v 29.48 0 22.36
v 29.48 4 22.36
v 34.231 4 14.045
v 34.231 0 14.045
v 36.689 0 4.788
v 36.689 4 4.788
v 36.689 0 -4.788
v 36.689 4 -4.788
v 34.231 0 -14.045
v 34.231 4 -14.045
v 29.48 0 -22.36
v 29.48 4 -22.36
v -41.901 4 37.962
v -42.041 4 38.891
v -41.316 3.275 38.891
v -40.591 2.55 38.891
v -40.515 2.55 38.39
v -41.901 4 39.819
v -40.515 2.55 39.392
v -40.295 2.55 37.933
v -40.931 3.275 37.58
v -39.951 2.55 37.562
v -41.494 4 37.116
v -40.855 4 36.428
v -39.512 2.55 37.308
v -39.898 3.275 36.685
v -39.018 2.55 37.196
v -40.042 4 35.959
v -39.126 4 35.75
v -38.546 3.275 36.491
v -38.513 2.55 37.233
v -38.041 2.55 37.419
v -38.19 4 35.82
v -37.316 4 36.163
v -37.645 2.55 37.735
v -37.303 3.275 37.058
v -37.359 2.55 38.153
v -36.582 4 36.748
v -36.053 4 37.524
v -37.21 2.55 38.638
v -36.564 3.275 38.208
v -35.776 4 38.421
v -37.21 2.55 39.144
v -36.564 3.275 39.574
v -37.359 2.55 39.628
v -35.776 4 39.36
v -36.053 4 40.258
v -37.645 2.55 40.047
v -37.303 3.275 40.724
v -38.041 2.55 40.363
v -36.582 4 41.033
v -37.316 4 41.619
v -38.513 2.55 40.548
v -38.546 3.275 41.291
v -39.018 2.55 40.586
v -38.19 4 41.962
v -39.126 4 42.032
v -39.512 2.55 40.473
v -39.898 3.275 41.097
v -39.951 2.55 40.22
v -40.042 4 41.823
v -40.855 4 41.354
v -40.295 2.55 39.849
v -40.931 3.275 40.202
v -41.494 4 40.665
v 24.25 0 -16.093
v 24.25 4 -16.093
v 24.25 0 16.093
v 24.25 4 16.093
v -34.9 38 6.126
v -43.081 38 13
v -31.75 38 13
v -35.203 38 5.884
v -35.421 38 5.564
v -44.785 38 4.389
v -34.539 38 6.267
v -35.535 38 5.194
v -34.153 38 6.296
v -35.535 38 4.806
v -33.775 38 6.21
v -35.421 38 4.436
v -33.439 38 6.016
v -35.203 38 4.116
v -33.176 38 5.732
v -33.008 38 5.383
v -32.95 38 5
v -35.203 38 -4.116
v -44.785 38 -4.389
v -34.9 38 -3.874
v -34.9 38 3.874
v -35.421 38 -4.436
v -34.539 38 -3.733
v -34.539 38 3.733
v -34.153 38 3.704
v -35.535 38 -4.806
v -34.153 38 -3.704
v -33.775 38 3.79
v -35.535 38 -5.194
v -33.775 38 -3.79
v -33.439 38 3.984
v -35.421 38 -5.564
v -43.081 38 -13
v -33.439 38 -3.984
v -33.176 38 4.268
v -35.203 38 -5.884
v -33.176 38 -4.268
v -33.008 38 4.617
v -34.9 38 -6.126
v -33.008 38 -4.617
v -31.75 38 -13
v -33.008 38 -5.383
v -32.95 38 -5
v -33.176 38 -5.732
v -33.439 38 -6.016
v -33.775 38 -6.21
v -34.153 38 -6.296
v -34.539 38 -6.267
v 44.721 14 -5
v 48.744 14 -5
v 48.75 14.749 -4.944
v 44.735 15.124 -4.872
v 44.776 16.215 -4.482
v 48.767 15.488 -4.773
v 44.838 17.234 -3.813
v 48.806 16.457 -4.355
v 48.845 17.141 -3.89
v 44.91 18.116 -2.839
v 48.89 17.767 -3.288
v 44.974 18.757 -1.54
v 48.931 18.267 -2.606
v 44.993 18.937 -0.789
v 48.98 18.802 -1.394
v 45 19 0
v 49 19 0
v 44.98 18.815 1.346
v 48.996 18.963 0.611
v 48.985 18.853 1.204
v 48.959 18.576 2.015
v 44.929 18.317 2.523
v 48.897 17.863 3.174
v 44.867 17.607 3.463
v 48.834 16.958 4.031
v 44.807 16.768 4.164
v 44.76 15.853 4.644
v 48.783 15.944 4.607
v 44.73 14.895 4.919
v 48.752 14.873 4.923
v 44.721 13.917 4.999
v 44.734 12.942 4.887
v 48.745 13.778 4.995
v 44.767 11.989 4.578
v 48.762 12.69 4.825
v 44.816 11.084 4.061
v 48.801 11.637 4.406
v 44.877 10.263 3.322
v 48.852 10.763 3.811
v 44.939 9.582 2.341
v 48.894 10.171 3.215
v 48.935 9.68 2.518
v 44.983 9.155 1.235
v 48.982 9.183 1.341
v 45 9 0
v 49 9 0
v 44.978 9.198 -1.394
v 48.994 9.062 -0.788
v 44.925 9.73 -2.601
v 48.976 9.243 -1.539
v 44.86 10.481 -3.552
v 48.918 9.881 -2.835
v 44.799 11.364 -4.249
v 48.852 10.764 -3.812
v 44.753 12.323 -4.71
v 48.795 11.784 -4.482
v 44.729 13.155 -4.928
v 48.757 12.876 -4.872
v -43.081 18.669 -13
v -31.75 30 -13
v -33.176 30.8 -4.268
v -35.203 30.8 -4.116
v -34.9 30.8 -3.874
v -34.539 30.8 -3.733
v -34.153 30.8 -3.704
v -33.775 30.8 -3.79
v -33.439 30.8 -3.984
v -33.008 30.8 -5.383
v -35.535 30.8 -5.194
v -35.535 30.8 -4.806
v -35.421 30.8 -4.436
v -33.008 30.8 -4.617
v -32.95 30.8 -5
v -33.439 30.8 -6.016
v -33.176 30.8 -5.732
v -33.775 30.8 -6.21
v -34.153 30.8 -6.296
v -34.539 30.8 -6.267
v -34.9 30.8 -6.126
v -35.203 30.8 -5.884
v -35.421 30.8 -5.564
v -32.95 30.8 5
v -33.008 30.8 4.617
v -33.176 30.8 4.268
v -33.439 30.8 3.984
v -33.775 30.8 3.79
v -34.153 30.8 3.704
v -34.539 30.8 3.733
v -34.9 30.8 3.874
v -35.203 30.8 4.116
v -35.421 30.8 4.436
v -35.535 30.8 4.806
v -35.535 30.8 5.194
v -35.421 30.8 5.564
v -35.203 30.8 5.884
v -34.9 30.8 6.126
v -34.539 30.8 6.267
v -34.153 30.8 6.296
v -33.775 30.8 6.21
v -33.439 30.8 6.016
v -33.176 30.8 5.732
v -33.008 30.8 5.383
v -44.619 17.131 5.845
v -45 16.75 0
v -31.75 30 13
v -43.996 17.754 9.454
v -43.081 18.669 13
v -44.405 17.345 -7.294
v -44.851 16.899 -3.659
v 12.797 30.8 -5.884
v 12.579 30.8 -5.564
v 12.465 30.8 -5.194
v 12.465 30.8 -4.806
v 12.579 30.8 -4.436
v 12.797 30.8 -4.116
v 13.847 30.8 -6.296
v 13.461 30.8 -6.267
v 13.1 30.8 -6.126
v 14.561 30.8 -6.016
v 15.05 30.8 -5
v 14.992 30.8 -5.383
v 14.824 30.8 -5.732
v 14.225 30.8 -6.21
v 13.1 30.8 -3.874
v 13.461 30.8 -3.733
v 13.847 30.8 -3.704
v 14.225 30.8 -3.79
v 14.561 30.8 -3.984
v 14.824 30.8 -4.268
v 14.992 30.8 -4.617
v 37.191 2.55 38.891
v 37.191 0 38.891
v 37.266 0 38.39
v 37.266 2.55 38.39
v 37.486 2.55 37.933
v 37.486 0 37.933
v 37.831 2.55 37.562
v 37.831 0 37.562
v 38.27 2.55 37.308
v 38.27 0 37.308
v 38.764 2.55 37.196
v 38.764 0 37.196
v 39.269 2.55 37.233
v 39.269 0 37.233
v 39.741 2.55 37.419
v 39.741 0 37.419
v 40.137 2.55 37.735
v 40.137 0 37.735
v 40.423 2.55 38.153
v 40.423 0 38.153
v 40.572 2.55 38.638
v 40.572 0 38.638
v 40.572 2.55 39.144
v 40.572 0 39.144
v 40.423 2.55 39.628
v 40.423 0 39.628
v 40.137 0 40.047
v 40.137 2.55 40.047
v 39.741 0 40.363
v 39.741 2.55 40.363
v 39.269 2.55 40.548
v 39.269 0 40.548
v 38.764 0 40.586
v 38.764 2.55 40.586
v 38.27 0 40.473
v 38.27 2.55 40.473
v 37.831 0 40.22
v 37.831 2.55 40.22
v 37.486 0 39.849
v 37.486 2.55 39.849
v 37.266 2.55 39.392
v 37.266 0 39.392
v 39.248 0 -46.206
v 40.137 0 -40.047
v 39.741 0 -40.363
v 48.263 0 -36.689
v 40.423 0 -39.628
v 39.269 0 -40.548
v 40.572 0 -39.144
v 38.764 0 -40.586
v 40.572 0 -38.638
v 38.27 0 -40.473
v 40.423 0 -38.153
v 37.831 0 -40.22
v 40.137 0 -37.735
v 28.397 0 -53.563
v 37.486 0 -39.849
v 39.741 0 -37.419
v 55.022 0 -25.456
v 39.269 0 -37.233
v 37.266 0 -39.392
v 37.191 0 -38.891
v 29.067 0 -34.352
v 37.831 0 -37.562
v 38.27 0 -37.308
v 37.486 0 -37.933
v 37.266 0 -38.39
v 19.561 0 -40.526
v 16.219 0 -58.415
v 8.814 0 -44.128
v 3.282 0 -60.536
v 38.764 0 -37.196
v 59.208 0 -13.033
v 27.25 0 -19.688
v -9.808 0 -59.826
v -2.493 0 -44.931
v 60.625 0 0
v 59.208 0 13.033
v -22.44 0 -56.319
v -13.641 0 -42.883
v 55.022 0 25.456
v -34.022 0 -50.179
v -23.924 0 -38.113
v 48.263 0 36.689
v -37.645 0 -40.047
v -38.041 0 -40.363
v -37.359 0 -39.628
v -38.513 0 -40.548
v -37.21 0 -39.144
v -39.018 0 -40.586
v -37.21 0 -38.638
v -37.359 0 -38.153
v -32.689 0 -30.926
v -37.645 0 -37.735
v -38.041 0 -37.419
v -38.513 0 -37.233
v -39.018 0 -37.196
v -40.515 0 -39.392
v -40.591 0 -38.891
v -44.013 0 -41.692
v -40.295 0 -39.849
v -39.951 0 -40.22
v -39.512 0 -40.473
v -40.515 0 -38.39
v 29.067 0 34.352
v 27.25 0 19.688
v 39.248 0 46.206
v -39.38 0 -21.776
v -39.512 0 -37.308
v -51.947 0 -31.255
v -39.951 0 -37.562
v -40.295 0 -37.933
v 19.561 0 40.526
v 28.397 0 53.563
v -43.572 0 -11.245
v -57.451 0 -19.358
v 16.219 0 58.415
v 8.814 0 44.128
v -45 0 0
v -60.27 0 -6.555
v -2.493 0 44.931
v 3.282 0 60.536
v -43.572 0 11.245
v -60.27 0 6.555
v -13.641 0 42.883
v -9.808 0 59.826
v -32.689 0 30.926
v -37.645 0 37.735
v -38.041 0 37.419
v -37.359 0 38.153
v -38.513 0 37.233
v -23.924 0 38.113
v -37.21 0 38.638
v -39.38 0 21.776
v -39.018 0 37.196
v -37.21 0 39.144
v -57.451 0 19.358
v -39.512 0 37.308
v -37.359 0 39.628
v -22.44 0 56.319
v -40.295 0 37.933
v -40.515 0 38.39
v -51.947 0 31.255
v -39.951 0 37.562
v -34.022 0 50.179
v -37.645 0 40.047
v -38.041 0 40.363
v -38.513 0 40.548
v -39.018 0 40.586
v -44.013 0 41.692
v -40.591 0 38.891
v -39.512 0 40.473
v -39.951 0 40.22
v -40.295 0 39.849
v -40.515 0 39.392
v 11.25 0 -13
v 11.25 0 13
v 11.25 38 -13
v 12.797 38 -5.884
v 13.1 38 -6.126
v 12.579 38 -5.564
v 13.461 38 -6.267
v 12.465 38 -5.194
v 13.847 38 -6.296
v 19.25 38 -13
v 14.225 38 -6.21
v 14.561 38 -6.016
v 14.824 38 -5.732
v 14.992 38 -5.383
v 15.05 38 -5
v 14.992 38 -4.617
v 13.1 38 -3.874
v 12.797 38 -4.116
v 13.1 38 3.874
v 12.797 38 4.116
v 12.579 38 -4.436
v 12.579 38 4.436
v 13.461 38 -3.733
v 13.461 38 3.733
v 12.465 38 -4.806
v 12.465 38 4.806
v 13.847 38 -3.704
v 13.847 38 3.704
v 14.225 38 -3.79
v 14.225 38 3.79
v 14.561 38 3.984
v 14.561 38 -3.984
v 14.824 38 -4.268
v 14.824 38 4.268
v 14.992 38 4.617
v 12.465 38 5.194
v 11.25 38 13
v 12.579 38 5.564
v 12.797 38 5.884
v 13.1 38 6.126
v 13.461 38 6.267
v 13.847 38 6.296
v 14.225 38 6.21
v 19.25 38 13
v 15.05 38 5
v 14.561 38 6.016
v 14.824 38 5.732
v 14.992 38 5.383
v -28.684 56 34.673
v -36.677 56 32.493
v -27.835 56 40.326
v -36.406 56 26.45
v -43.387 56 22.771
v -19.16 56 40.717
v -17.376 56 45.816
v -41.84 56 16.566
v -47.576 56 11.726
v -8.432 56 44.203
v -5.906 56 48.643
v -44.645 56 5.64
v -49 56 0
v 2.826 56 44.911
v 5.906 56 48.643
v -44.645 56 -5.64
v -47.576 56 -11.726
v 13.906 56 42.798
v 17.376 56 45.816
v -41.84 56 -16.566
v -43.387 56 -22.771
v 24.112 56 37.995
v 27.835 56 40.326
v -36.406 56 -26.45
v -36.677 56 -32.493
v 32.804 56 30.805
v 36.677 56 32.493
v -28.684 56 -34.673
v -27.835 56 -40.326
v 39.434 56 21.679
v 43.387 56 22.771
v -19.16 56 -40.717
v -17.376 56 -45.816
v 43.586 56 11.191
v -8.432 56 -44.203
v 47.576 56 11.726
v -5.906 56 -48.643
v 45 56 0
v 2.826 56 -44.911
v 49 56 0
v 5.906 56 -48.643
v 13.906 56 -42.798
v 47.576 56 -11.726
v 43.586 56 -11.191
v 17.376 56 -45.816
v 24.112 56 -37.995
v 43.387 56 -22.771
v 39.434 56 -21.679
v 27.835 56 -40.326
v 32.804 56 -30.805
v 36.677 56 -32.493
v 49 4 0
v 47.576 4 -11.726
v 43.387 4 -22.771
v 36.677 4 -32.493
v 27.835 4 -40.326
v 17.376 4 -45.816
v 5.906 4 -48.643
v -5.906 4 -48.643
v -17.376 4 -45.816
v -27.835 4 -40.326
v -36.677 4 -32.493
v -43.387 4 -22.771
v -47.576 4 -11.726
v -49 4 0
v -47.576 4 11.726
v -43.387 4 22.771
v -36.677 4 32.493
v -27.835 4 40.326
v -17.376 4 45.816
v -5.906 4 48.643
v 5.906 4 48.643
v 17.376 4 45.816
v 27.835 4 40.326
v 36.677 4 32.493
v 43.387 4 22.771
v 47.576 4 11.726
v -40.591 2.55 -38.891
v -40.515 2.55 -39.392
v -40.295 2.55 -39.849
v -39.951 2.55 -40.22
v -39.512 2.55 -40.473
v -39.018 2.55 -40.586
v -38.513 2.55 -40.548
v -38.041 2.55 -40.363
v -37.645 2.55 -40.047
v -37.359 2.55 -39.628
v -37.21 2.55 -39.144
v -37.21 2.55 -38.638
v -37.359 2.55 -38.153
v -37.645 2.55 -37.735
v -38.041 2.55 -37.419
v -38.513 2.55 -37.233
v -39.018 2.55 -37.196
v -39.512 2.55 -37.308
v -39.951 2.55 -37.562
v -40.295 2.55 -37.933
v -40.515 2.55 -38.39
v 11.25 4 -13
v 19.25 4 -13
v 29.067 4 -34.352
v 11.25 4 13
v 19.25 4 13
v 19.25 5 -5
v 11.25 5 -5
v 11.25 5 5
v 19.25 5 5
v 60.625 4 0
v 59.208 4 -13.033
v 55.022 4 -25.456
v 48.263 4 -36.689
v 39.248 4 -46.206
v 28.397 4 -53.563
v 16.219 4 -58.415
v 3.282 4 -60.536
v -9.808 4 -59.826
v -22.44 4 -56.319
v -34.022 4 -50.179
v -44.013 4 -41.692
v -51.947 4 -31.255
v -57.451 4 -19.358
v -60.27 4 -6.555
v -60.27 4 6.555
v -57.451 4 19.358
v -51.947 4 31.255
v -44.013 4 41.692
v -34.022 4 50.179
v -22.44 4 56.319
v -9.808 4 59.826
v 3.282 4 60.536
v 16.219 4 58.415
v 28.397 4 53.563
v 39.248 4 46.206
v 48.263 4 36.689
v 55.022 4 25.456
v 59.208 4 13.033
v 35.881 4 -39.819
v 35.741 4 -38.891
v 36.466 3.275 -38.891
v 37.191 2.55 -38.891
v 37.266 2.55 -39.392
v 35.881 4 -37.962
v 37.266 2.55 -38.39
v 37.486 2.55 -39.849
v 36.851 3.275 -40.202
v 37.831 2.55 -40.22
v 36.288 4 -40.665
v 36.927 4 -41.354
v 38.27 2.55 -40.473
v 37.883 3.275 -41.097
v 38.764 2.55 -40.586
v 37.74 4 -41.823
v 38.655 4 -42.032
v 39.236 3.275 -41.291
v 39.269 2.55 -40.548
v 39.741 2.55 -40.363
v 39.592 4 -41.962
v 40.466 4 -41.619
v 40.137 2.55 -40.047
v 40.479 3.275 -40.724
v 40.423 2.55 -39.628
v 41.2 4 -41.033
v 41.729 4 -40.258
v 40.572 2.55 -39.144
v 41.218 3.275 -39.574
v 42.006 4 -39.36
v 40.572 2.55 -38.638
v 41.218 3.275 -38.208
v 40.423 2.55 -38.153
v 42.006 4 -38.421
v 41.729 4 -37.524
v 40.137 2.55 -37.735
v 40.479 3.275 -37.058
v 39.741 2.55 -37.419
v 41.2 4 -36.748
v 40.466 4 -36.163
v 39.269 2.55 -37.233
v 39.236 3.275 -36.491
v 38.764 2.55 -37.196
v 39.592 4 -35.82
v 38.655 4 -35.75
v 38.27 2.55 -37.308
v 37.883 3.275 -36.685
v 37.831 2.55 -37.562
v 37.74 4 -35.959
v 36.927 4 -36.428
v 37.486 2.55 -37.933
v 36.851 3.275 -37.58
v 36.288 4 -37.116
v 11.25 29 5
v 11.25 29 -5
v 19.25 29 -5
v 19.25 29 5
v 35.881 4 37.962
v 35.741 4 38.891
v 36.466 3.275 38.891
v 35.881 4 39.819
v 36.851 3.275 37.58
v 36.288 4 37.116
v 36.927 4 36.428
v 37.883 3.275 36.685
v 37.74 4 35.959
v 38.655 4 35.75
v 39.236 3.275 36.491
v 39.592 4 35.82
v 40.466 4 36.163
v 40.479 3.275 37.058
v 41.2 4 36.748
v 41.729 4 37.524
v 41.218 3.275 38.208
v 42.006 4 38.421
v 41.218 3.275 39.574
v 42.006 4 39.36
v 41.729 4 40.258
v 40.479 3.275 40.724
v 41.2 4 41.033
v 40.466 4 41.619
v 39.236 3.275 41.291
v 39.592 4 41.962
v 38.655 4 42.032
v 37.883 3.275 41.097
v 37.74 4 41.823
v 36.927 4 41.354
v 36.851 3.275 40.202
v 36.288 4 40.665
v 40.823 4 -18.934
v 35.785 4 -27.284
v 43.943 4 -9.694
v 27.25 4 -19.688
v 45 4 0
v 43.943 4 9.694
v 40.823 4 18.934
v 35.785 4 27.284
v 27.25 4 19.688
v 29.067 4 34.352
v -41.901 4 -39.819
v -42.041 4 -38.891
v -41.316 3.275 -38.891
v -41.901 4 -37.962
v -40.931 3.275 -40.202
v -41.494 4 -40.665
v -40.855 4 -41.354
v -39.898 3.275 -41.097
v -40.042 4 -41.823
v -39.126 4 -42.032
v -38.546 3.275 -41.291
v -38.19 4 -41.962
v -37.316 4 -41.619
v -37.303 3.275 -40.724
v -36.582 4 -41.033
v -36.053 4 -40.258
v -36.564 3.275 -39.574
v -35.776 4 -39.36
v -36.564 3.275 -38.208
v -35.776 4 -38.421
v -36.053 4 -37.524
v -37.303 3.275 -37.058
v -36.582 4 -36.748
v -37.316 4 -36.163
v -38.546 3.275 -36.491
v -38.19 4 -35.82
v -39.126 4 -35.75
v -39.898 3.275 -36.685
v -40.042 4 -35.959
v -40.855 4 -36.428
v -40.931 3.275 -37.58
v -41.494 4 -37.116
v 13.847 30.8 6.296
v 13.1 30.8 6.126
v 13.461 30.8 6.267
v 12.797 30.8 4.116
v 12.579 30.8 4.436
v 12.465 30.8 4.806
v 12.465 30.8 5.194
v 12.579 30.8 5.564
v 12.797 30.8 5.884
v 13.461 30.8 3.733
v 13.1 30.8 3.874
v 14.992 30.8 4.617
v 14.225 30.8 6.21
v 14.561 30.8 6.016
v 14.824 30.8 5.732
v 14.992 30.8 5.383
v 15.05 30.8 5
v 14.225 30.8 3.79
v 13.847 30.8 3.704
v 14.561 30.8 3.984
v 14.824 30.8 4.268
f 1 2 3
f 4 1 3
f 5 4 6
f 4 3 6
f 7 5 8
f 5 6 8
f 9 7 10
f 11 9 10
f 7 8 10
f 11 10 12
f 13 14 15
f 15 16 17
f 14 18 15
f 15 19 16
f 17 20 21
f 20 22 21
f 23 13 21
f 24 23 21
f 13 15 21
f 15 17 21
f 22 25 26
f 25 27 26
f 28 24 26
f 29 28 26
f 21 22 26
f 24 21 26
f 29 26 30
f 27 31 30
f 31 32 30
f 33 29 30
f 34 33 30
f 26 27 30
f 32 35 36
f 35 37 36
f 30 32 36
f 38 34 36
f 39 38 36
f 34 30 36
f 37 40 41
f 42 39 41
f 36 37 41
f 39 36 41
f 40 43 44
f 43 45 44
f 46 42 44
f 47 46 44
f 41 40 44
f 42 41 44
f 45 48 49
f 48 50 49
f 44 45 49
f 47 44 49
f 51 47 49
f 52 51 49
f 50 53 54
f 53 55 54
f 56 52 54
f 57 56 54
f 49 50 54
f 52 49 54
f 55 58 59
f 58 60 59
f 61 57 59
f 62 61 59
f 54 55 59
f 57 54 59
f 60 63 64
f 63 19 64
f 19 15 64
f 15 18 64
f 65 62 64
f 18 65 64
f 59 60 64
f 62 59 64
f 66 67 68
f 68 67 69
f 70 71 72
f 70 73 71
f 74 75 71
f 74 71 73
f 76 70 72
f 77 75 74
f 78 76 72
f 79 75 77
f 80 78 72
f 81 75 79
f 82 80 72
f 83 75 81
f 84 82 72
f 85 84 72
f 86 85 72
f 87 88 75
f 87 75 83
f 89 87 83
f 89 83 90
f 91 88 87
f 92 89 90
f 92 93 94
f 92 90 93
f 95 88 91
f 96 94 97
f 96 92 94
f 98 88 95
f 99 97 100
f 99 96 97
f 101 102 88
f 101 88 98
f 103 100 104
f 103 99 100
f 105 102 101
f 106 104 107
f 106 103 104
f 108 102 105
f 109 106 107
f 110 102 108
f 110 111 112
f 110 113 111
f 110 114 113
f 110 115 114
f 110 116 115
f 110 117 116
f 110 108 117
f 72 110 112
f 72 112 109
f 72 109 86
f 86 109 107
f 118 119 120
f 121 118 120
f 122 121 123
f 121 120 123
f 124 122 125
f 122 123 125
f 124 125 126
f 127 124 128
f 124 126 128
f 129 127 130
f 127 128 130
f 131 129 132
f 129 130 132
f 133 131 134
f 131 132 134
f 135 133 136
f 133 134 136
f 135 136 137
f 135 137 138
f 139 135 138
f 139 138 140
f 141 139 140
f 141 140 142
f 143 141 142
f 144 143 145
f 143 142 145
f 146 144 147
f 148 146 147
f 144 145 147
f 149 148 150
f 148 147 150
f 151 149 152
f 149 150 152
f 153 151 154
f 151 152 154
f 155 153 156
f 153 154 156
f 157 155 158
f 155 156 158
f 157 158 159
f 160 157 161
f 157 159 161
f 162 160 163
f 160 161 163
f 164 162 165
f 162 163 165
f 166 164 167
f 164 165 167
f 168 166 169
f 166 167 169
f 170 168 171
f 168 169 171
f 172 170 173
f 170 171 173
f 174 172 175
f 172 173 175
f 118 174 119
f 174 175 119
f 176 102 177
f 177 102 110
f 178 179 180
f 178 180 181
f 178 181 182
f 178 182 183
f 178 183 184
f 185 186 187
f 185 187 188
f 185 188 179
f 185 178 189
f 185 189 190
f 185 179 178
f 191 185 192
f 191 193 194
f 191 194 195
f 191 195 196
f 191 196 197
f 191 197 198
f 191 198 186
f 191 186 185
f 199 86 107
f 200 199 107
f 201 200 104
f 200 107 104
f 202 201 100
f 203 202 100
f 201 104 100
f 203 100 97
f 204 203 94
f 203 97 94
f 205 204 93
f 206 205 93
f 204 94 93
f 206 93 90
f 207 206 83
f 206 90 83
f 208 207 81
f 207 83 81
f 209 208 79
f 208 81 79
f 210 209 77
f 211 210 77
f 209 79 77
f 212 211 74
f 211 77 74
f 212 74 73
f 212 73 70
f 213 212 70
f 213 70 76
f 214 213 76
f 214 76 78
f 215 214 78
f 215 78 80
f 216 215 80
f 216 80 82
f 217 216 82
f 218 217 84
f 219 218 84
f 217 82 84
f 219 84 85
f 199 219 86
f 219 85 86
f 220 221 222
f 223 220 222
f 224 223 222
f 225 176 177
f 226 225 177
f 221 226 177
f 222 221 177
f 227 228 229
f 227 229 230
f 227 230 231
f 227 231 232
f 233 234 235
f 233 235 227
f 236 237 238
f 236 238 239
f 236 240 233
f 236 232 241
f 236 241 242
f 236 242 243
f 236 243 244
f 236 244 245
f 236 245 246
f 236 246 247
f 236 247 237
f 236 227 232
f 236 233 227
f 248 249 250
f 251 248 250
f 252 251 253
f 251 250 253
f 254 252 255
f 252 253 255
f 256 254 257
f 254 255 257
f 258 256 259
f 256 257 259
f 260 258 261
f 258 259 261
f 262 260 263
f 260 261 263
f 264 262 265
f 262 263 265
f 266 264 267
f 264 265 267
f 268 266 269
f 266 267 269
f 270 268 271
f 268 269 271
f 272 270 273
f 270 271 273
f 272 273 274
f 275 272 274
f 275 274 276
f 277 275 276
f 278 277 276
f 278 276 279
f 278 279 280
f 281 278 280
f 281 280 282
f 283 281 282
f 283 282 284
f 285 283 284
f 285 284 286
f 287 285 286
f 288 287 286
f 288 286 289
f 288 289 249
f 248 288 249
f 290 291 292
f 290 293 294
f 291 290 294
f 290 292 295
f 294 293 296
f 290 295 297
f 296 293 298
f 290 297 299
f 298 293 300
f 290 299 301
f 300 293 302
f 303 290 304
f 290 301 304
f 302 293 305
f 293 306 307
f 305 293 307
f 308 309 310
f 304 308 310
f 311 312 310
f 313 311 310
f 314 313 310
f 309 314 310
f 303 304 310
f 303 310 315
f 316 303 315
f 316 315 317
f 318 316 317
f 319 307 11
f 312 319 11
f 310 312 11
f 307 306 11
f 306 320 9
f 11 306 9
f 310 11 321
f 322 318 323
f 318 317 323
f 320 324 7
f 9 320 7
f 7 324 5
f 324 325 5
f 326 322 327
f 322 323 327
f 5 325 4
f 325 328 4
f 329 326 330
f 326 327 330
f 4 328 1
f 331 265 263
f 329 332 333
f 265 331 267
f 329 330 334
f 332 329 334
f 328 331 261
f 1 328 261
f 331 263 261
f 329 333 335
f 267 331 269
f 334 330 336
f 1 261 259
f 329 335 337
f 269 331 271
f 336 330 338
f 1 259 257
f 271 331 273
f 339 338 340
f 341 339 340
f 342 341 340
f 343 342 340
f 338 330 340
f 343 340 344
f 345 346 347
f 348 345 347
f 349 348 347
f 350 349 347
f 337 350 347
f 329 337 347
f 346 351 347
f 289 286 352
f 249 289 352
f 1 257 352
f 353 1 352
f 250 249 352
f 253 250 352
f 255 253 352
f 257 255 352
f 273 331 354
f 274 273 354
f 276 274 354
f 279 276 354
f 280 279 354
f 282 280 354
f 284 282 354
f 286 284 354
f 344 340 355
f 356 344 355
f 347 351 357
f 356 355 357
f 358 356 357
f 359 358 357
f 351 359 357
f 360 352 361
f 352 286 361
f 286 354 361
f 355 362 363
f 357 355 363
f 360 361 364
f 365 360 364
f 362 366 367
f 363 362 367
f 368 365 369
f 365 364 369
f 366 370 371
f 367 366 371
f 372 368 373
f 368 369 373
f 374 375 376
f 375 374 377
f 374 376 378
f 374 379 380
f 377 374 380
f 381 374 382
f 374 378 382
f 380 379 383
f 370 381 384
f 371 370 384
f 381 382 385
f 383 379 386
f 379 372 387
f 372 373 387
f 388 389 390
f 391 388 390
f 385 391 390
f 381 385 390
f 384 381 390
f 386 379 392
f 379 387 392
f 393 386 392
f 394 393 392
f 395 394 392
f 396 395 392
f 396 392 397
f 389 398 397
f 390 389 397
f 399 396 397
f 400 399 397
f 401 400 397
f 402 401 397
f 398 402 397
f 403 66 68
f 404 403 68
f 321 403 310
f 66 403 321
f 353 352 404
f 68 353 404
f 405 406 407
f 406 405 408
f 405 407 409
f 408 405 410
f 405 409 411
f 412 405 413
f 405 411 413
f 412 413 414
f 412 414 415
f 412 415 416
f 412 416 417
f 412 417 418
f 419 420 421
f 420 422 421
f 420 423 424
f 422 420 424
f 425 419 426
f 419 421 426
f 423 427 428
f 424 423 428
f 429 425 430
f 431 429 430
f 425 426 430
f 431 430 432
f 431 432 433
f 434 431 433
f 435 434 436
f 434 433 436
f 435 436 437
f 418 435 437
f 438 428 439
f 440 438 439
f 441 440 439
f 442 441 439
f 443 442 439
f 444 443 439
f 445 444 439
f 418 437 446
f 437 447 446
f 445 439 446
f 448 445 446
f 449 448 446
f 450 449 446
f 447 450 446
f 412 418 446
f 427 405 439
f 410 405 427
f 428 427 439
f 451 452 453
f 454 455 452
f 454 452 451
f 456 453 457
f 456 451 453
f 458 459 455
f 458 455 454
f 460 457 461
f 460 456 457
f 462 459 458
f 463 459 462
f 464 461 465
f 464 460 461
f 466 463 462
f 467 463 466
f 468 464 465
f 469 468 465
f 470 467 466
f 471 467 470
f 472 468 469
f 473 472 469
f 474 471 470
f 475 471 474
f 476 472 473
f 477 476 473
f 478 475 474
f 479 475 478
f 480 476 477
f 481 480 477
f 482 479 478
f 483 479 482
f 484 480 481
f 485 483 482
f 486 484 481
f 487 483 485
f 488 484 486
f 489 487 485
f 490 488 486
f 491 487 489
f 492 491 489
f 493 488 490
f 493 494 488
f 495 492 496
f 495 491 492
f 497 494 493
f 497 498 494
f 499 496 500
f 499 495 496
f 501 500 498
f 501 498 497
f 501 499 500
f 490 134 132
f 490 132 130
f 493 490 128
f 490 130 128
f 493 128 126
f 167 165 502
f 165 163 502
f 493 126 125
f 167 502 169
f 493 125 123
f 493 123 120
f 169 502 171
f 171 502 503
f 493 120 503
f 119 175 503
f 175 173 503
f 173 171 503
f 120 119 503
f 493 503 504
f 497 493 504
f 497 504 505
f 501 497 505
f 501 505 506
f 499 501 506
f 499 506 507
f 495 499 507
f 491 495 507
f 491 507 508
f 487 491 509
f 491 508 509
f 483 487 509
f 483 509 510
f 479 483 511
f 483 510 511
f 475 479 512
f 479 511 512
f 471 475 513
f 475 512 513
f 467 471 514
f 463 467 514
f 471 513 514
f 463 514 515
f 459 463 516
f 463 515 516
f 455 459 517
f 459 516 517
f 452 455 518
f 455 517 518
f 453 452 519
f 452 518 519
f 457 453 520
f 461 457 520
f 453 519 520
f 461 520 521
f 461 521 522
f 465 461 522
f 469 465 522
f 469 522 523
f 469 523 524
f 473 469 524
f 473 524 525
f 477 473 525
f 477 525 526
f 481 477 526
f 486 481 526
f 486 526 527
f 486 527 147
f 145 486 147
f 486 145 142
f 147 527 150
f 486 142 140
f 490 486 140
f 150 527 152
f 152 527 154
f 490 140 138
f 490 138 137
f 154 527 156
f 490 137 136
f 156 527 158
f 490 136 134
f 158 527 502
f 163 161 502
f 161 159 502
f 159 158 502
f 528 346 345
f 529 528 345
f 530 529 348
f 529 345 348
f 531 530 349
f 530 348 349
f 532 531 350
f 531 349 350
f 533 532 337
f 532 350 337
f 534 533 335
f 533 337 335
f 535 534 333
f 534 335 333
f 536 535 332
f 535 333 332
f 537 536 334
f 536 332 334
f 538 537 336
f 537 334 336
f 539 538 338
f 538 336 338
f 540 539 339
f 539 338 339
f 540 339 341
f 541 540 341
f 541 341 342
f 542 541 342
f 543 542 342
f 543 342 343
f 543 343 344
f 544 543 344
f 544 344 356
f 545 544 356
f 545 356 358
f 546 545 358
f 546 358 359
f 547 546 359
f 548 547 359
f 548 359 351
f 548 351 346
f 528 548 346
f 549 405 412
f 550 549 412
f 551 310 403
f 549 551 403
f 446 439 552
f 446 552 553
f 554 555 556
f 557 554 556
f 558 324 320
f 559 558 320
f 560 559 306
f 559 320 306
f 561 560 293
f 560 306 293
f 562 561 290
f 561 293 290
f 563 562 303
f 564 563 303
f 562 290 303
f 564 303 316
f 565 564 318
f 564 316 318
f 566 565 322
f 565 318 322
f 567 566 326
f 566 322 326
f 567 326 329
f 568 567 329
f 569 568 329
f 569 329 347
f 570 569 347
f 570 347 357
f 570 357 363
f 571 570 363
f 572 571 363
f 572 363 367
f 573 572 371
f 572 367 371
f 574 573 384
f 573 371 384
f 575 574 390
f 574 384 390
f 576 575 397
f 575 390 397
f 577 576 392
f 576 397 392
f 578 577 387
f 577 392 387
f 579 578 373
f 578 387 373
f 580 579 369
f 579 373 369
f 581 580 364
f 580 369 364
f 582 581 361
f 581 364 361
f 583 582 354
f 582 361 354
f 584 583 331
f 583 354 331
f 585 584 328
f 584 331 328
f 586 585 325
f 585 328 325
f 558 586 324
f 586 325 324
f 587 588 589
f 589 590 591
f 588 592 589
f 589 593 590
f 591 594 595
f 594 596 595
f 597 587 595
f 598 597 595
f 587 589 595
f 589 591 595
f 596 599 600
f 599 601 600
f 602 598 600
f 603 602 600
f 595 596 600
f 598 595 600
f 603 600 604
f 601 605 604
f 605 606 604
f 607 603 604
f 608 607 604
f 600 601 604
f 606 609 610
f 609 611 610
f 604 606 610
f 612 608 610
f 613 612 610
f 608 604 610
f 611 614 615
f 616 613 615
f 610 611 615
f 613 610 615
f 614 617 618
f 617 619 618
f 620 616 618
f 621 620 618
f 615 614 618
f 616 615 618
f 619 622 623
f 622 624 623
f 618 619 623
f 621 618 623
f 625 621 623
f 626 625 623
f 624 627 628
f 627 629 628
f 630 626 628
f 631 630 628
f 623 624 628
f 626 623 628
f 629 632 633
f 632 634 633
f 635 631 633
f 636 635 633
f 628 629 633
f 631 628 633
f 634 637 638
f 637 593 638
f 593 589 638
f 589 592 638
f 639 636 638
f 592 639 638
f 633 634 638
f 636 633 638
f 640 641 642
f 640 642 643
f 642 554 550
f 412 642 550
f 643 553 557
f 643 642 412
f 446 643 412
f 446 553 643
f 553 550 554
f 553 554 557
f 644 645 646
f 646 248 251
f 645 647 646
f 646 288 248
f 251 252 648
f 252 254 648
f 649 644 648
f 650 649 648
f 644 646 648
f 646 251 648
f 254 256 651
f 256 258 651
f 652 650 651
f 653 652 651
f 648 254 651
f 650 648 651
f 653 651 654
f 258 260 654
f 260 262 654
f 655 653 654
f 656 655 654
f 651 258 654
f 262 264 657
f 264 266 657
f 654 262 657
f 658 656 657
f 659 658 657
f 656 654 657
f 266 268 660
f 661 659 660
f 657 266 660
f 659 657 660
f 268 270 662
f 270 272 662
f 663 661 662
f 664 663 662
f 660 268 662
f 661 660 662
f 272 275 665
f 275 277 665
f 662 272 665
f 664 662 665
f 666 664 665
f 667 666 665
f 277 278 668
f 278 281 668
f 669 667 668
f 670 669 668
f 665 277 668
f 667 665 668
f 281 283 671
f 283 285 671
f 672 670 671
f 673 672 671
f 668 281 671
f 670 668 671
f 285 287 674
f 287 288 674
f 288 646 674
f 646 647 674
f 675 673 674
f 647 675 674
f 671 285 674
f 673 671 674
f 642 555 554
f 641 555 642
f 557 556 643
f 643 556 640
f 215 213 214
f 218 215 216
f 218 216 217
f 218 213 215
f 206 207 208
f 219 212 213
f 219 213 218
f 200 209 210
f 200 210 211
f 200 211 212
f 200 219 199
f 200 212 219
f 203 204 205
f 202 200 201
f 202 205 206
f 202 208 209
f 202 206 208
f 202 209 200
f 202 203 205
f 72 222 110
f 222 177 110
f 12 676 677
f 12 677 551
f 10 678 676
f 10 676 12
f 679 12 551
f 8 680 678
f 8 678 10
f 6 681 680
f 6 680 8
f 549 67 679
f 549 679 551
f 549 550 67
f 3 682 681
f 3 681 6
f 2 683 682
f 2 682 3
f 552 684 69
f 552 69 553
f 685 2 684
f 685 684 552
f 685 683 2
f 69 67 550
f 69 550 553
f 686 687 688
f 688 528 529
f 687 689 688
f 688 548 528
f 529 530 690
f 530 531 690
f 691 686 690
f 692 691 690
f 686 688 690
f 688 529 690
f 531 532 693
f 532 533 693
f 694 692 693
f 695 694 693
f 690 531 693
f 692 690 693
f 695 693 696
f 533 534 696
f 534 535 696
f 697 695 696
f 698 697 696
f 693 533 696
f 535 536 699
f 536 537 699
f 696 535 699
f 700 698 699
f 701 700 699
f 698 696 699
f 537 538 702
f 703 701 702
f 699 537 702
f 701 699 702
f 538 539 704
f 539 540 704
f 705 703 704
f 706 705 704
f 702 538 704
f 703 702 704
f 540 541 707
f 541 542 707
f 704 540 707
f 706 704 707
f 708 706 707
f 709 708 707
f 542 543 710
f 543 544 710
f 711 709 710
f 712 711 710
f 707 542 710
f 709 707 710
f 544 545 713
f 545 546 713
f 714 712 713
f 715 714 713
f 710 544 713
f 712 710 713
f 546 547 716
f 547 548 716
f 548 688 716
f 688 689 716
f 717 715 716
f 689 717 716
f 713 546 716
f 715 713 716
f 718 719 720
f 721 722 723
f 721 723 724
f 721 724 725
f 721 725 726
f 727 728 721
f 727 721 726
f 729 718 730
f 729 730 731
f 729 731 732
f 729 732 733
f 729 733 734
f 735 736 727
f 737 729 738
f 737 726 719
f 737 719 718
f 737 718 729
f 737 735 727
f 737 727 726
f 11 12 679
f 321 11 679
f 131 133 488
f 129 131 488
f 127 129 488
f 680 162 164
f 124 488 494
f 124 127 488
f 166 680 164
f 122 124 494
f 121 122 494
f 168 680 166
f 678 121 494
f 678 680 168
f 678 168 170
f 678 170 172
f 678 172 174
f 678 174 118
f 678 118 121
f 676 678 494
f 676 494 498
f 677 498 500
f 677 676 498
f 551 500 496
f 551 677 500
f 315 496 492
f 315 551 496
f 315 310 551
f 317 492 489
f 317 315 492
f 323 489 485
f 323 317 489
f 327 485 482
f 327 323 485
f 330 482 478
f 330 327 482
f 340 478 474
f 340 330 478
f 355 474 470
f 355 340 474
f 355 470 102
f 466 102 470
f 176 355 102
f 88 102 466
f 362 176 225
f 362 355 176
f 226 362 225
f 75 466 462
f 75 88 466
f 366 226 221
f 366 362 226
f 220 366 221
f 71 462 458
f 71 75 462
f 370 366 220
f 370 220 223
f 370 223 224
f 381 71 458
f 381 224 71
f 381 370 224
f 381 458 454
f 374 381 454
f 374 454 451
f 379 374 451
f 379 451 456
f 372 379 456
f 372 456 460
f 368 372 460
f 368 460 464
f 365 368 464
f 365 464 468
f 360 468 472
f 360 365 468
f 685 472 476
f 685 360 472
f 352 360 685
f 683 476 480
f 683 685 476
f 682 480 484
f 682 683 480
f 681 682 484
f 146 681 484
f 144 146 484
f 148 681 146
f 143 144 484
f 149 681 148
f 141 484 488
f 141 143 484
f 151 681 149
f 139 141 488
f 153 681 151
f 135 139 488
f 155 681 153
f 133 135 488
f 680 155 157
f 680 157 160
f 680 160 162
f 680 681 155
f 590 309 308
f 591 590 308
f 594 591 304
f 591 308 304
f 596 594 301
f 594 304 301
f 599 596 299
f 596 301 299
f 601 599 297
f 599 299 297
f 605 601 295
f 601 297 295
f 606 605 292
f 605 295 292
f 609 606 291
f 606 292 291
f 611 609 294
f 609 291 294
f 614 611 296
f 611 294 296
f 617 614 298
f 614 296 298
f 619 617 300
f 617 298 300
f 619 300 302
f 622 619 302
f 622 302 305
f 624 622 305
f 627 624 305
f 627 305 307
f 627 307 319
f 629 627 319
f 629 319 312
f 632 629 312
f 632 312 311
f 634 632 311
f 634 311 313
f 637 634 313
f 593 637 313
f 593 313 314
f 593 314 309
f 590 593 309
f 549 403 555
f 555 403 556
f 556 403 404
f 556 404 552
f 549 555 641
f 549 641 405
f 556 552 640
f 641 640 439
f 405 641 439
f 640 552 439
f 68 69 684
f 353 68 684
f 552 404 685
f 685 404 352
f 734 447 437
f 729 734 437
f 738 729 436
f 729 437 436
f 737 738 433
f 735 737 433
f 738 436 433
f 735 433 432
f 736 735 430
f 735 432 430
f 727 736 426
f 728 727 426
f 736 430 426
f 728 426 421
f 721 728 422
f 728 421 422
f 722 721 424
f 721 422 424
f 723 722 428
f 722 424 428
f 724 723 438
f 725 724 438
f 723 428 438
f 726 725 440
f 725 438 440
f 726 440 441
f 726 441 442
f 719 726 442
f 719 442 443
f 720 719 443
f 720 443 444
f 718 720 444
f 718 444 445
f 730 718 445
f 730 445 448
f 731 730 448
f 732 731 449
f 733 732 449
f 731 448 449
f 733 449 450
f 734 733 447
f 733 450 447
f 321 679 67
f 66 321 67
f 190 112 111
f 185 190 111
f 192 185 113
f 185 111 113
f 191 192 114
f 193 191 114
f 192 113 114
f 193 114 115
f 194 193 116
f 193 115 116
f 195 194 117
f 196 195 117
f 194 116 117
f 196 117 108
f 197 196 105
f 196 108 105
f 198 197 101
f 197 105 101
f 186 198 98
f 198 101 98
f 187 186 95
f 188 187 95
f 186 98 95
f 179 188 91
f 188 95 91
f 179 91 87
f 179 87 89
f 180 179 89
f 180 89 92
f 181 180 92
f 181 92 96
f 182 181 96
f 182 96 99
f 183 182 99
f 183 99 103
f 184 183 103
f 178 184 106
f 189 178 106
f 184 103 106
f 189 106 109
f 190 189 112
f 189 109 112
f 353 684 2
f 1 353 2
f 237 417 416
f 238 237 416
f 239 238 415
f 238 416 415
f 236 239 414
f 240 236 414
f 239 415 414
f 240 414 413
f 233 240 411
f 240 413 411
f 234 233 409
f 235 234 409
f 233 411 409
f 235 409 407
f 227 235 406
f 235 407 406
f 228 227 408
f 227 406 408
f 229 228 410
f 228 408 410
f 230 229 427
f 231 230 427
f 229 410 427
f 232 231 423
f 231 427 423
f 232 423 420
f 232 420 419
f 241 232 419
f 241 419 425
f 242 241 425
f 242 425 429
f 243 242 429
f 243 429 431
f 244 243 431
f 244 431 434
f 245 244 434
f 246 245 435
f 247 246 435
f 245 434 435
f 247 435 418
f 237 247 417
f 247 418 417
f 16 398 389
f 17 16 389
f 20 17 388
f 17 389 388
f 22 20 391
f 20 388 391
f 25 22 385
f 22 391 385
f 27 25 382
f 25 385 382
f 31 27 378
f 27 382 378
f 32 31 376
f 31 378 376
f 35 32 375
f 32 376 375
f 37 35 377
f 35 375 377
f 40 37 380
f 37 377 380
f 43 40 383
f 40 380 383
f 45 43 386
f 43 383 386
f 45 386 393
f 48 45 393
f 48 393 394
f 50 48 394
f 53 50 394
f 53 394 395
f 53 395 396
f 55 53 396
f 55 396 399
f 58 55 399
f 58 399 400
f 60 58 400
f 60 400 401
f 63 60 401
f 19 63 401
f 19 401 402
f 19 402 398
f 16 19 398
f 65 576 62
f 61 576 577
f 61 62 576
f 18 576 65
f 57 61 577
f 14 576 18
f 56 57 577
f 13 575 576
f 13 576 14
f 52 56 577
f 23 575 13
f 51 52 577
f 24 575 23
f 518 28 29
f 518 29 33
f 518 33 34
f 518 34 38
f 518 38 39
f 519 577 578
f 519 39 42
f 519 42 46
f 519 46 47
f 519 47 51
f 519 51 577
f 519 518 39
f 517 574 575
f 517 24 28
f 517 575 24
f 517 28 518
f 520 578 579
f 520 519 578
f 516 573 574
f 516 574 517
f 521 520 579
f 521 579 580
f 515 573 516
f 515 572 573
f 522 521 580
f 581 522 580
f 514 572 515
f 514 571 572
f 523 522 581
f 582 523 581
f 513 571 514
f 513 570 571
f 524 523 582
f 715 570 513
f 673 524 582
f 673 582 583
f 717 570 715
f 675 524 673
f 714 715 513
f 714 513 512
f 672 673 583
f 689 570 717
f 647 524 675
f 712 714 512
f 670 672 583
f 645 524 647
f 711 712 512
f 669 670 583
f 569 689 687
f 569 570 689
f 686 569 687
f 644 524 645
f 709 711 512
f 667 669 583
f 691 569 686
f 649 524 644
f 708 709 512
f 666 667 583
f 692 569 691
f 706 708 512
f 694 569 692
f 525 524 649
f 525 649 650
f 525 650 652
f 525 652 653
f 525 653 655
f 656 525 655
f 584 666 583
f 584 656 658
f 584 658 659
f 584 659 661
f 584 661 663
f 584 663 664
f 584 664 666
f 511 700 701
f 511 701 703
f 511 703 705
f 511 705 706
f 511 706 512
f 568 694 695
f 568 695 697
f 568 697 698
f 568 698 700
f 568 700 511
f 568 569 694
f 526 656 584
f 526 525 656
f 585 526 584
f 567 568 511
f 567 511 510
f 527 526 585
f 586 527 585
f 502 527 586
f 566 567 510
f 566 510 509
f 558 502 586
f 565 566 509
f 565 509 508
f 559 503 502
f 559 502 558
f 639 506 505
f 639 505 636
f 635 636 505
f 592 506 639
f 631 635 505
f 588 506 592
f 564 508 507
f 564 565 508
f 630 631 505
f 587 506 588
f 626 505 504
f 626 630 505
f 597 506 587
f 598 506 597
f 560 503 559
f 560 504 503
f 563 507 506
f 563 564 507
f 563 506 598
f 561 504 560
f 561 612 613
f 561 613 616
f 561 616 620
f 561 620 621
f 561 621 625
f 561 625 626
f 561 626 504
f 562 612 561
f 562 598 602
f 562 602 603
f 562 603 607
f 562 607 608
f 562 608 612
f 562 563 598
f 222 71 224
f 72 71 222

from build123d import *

# Parameters (mm, degrees)
SKETCH1_R                                           = 60.625
SKETCH1_R_2                                         = 45
BOSS_EXTRUDE1_DEPTH                                 = 4
SKETCH2_R                                           = 49
SKETCH2_R_2                                         = 45
BOSS_EXTRUDE2_DEPTH                                 = 52
SKETCH4_W                                           = 13.25
SKETCH4_H                                           = 8
SKETCH4_W_2                                         = 8
SKETCH4_H_2                                         = 38
BOSS_EXTRUDE4_DEPTH                                 = 13
BOSS_EXTRUDE5_DEPTH                                 = 4
SKETCH7_R                                           = 1.3
CUT_EXTRUDE4_DEPTH                                  = 7.2
SKETCH9_W                                           = 10
SKETCH9_H                                           = 24
CUT_EXTRUDE7_DEPTH                                  = 8
CUT_EXTRUDE8_REACH                                  = 111.625
SKETCH11_R                                          = 5
CUT_EXTRUDE9_DEPTH                                  = 5.0000001
CSK_FOR_M3_COUNTERSUNK_FLAT_HEAD_SCREW1_D           = 3.4
CSK_FOR_M3_COUNTERSUNK_FLAT_HEAD_SCREW1_DEPTH       = 4
CSK_FOR_M3_COUNTERSUNK_FLAT_HEAD_SCREW1_CSINK_D     = 6.3
CSK_FOR_M3_COUNTERSUNK_FLAT_HEAD_SCREW1_CSINK_ANGLE = 90


with BuildPart() as part:
    # Sketch1 → Boss-Extrude1 (new body)
    with BuildSketch(Plane(origin=(0, 0, 0), x_dir=(1, 0, 0), z_dir=(0, 1, 0))):
        Circle(SKETCH1_R)
        Circle(SKETCH1_R_2, mode=Mode.SUBTRACT)
    extrude(amount=BOSS_EXTRUDE1_DEPTH)

    # Sketch2 → Boss-Extrude2 (add)
    with BuildSketch(Plane(origin=(0, 4, 0), x_dir=(1, 0, 0), z_dir=(0, 1, 0))):
        Circle(SKETCH2_R)
        Circle(SKETCH2_R_2, mode=Mode.SUBTRACT)
    extrude(amount=BOSS_EXTRUDE2_DEPTH)

    # Sketch4 → Boss-Extrude4 (add, symmetric)
    with BuildSketch(Plane.XY):
        with Locations((-38.375, 34)):
            Rectangle(SKETCH4_W, SKETCH4_H)
        Polygon((-31.75, 30), (-45, 30), (-45, 16.75), align=None)
        with Locations((15.25, 19)):
            Rectangle(SKETCH4_W_2, SKETCH4_H_2)
    extrude(amount=BOSS_EXTRUDE4_DEPTH, both=True)

    # Sketch5 → Boss-Extrude5 (add)
    with BuildSketch(Plane.XZ):
        with BuildLine():
            Line((11.25, 13), (29.067400866, 34.352382842))
            ThreePointArc((29.067400866, 34.352382842), (45, 0), (29.067400866, -34.352382842))
            Line((29.067400866, -34.352382842), (11.25, -13))
            Line((11.25, -13), (11.25, 13))
        make_face()
    extrude(amount=-BOSS_EXTRUDE5_DEPTH)

    # Sketch7 → Cut-Extrude4 (cut)
    with BuildSketch(Plane(origin=(0, 38, 0), x_dir=(1, 0, 0), z_dir=(0, 1, 0))):
        with Locations((-34.25, 5)):
            Circle(SKETCH7_R)
        with Locations((-34.25, -5)):
            Circle(SKETCH7_R)
        with Locations((13.75, 5)):
            Circle(SKETCH7_R)
        with Locations((13.75, -5)):
            Circle(SKETCH7_R)
    extrude(amount=-CUT_EXTRUDE4_DEPTH, mode=Mode.SUBTRACT)

    # Sketch9 → Cut-Extrude7 (cut)
    with BuildSketch(Plane.ZY.offset(-11.25)):
        with Locations((0, 17)):
            Rectangle(SKETCH9_W, SKETCH9_H)
    extrude(amount=-CUT_EXTRUDE7_DEPTH, mode=Mode.SUBTRACT)

    # Sketch11 → Cut-Extrude8 (cut, up to next)
    with BuildSketch(Plane(origin=(49, 0, 0), x_dir=(0, 0, -1), z_dir=(1, 0, 0)), mode=Mode.PRIVATE) as cut_extrude8_sk1:
        with Locations((0, 14)):
            Circle(SKETCH11_R)
    cut_extrude8_tool1 = extrude(cut_extrude8_sk1.sketch, amount=-CUT_EXTRUDE8_REACH, mode=Mode.PRIVATE) & part.part
    add(cut_extrude8_tool1.solids().sort_by_distance((49, 14, 0))[0], mode=Mode.SUBTRACT)

    # Sketch12 → Cut-Extrude9 (cut, through all)
    with BuildSketch(Plane(origin=(0, 4, 0), x_dir=(1, 0, 0), z_dir=(0, 1, 0))):
        with BuildLine():
            Line((29.479537487, 22.359715328), (27.25, 19.687836398))
            Line((27.25, 19.687836398), (27.25, -19.687836398))
            Line((27.25, -19.687836398), (29.479537487, -22.359715328))
            ThreePointArc((29.479537487, -22.359715328), (37, 0), (29.479537487, 22.359715328))
        make_face()
        Polygon((27.25, -19.687836398), (27.25, 19.687836398), (24.25, 16.092634774), (24.25, -16.092634774), align=None)
    extrude(amount=-CUT_EXTRUDE9_DEPTH, mode=Mode.SUBTRACT)

    # CSK for M3 Countersunk Flat Head Screw1
    with Locations(Plane(origin=(0, 4, 0), x_dir=(1, 0, 0), z_dir=(0, 1, 0))):
        with Locations((-38.890872965, 38.890872965), (-38.890872965, -38.890872965), (38.890872965, -38.890872965), (38.890872965, 38.890872965)):
            CounterSinkHole(CSK_FOR_M3_COUNTERSUNK_FLAT_HEAD_SCREW1_D / 2, CSK_FOR_M3_COUNTERSUNK_FLAT_HEAD_SCREW1_CSINK_D / 2, depth=CSK_FOR_M3_COUNTERSUNK_FLAT_HEAD_SCREW1_DEPTH, counter_sink_angle=CSK_FOR_M3_COUNTERSUNK_FLAT_HEAD_SCREW1_CSINK_ANGLE)


solid = part.part
